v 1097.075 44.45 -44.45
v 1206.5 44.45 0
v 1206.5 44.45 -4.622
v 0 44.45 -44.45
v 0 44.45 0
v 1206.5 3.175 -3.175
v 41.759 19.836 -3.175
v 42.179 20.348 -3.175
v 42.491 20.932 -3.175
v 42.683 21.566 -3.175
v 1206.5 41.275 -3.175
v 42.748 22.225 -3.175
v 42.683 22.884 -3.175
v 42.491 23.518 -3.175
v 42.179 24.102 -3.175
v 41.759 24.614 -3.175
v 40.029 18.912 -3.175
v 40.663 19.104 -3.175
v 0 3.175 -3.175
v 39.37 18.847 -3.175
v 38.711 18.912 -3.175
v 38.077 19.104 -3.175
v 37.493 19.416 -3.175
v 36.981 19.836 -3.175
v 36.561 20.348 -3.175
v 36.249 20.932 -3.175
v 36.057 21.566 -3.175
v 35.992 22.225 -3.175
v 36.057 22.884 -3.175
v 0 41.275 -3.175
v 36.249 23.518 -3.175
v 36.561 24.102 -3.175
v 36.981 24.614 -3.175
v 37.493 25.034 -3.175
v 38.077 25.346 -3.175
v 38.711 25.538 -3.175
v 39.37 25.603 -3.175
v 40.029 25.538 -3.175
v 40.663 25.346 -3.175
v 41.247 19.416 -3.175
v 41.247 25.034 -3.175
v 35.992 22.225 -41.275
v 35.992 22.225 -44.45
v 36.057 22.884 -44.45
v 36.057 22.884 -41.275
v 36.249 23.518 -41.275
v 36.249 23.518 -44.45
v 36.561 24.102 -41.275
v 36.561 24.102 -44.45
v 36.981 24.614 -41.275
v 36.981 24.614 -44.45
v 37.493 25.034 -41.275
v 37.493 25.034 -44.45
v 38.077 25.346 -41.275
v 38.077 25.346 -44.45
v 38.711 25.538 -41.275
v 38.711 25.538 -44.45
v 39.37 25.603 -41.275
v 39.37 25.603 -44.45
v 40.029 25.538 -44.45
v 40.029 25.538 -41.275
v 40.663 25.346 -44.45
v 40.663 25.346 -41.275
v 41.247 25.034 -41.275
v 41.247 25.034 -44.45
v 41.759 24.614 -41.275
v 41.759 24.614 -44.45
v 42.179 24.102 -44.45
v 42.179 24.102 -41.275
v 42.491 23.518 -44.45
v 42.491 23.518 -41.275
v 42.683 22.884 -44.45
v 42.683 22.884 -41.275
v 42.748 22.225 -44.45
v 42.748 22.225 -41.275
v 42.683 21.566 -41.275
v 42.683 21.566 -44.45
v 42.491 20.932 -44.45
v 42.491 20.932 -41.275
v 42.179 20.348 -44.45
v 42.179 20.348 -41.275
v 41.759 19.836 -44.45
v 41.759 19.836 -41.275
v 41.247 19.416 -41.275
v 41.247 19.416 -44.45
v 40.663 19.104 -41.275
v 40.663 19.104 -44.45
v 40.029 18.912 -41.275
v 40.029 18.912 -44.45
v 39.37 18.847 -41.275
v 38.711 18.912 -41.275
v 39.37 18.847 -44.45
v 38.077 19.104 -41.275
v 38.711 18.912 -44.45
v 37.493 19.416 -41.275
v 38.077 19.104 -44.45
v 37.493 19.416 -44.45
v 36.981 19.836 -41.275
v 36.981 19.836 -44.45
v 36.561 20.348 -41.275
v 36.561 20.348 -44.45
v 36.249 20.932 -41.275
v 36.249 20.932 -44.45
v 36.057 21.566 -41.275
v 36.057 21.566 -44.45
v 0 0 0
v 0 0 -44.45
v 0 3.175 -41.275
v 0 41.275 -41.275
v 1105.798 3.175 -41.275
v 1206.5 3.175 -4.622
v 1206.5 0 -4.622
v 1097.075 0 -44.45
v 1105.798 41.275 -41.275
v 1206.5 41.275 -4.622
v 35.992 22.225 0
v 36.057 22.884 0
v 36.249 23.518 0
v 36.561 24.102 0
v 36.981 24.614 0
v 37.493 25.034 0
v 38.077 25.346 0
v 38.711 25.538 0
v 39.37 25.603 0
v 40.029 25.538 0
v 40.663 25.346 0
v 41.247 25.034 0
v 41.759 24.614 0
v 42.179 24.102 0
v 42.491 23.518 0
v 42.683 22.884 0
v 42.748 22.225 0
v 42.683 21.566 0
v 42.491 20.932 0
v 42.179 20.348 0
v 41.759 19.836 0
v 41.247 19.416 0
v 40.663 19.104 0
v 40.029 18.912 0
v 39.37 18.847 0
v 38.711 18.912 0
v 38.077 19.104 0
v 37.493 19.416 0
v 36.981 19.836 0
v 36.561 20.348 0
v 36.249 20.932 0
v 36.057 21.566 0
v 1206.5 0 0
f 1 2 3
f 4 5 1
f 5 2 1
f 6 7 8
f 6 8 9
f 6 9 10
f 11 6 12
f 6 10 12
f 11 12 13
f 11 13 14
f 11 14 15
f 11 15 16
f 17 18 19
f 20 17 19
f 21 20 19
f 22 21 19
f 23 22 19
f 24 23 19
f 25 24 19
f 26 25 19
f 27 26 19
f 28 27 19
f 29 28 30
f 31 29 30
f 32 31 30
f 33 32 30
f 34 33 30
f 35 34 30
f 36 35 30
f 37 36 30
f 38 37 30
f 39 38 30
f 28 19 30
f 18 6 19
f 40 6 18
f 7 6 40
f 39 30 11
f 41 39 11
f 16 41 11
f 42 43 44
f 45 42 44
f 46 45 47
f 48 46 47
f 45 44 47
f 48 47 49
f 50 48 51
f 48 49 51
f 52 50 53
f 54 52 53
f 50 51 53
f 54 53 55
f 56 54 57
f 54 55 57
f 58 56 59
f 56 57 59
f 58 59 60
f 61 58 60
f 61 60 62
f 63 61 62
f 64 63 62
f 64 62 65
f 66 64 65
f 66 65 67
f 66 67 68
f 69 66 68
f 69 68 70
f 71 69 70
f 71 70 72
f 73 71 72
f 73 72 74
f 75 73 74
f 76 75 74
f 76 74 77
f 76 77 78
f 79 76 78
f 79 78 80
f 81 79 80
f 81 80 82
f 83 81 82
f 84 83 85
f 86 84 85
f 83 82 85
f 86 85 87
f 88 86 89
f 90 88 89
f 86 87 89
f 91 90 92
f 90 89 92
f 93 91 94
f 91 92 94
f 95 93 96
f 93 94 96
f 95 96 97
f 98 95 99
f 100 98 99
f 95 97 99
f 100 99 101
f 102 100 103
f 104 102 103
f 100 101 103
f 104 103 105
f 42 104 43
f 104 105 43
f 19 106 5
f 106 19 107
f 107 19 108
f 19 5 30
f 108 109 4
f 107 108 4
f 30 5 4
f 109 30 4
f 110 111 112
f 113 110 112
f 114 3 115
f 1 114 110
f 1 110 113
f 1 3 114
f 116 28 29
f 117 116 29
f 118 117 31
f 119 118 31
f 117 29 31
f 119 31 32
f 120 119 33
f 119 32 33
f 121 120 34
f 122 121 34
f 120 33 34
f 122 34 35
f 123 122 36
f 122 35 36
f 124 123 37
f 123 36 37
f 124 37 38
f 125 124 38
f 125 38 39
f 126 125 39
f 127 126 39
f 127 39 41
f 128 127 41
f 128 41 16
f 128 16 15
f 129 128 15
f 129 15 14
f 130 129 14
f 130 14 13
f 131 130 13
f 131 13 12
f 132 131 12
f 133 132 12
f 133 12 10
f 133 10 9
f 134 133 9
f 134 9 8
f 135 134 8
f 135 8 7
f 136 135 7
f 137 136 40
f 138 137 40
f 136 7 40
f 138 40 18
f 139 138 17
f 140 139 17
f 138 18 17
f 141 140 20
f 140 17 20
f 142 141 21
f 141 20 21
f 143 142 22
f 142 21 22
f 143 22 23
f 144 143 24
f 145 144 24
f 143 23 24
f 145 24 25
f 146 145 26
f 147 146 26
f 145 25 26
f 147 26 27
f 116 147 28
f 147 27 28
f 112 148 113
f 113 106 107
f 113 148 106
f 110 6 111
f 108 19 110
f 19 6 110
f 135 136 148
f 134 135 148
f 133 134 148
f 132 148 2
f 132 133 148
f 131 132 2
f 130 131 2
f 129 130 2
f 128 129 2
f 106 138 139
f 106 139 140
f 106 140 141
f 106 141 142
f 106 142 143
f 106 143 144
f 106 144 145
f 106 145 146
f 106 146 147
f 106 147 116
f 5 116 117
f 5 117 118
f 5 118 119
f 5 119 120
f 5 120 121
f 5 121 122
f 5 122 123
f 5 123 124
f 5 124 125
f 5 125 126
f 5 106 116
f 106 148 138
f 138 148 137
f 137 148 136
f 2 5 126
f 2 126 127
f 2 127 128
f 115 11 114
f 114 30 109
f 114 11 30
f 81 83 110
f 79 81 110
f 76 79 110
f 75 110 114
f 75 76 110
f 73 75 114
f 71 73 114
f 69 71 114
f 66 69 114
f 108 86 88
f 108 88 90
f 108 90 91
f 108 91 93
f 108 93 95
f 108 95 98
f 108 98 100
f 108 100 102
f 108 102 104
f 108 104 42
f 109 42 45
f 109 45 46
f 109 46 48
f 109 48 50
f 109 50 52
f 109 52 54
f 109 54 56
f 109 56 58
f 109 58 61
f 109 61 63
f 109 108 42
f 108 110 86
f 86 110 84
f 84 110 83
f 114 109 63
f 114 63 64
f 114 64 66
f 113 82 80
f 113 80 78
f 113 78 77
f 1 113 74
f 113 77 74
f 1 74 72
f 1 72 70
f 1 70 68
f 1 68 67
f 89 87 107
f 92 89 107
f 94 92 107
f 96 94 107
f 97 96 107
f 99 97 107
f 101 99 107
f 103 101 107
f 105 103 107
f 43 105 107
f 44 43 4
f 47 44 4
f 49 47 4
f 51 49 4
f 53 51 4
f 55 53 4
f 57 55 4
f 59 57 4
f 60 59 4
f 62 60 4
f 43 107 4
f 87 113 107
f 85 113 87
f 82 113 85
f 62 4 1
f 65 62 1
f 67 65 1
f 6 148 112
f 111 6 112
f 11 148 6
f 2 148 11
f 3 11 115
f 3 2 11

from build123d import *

# Parameters (mm, degrees)
SKETCH1_W               = 44.45
SKETCH1_H               = 44.45
SKETCH1_W_2             = 38.1
SKETCH1_H_2             = 38.1
BOSS_EXTRUDE1_DEPTH     = 1219.2
CUT_EXTRUDE1_DEPTH      = 45.45
F_1_4_CLEARANCE_HOLE1_D = 6.7564
CUT_EXTRUDE2_DEPTH      = 45.45


with BuildPart() as part:
    # Sketch1 → Boss-Extrude1 (new body)
    with BuildSketch(Plane(origin=(0, 0, 0), x_dir=(0, 0, -1), z_dir=(1, 0, 0))):
        with Locations((22.225, 22.225)):
            Rectangle(SKETCH1_W, SKETCH1_H)
        with Locations((22.225, 22.225)):
            Rectangle(SKETCH1_W_2, SKETCH1_H_2, mode=Mode.SUBTRACT)
    extrude(amount=BOSS_EXTRUDE1_DEPTH)

    # Sketch2 → Cut-Extrude1 (cut, through all)
    with BuildSketch(Plane(origin=(0, 44.45, 0), x_dir=(1, 0, 0), z_dir=(0, 1, 0))):
        Polygon((1219.2, 0), (1097.074628705, 44.45), (1219.2, 44.45), align=None)
    extrude(amount=-CUT_EXTRUDE1_DEPTH, mode=Mode.SUBTRACT)

    # 1/4 Clearance Hole1 (through all)
    with Locations(Plane.XY):
        with Locations((39.37, 22.225)):
            Hole(F_1_4_CLEARANCE_HOLE1_D / 2)

    # Sketch5 → Cut-Extrude2 (cut, through all)
    with BuildSketch(Plane(origin=(0, 44.45, 0), x_dir=(1, 0, 0), z_dir=(0, 1, 0))):
        Polygon((1219.2, 0), (1206.5, 0), (1206.5, 4.622421975), align=None)
    extrude(amount=-CUT_EXTRUDE2_DEPTH, mode=Mode.SUBTRACT)


solid = part.part
